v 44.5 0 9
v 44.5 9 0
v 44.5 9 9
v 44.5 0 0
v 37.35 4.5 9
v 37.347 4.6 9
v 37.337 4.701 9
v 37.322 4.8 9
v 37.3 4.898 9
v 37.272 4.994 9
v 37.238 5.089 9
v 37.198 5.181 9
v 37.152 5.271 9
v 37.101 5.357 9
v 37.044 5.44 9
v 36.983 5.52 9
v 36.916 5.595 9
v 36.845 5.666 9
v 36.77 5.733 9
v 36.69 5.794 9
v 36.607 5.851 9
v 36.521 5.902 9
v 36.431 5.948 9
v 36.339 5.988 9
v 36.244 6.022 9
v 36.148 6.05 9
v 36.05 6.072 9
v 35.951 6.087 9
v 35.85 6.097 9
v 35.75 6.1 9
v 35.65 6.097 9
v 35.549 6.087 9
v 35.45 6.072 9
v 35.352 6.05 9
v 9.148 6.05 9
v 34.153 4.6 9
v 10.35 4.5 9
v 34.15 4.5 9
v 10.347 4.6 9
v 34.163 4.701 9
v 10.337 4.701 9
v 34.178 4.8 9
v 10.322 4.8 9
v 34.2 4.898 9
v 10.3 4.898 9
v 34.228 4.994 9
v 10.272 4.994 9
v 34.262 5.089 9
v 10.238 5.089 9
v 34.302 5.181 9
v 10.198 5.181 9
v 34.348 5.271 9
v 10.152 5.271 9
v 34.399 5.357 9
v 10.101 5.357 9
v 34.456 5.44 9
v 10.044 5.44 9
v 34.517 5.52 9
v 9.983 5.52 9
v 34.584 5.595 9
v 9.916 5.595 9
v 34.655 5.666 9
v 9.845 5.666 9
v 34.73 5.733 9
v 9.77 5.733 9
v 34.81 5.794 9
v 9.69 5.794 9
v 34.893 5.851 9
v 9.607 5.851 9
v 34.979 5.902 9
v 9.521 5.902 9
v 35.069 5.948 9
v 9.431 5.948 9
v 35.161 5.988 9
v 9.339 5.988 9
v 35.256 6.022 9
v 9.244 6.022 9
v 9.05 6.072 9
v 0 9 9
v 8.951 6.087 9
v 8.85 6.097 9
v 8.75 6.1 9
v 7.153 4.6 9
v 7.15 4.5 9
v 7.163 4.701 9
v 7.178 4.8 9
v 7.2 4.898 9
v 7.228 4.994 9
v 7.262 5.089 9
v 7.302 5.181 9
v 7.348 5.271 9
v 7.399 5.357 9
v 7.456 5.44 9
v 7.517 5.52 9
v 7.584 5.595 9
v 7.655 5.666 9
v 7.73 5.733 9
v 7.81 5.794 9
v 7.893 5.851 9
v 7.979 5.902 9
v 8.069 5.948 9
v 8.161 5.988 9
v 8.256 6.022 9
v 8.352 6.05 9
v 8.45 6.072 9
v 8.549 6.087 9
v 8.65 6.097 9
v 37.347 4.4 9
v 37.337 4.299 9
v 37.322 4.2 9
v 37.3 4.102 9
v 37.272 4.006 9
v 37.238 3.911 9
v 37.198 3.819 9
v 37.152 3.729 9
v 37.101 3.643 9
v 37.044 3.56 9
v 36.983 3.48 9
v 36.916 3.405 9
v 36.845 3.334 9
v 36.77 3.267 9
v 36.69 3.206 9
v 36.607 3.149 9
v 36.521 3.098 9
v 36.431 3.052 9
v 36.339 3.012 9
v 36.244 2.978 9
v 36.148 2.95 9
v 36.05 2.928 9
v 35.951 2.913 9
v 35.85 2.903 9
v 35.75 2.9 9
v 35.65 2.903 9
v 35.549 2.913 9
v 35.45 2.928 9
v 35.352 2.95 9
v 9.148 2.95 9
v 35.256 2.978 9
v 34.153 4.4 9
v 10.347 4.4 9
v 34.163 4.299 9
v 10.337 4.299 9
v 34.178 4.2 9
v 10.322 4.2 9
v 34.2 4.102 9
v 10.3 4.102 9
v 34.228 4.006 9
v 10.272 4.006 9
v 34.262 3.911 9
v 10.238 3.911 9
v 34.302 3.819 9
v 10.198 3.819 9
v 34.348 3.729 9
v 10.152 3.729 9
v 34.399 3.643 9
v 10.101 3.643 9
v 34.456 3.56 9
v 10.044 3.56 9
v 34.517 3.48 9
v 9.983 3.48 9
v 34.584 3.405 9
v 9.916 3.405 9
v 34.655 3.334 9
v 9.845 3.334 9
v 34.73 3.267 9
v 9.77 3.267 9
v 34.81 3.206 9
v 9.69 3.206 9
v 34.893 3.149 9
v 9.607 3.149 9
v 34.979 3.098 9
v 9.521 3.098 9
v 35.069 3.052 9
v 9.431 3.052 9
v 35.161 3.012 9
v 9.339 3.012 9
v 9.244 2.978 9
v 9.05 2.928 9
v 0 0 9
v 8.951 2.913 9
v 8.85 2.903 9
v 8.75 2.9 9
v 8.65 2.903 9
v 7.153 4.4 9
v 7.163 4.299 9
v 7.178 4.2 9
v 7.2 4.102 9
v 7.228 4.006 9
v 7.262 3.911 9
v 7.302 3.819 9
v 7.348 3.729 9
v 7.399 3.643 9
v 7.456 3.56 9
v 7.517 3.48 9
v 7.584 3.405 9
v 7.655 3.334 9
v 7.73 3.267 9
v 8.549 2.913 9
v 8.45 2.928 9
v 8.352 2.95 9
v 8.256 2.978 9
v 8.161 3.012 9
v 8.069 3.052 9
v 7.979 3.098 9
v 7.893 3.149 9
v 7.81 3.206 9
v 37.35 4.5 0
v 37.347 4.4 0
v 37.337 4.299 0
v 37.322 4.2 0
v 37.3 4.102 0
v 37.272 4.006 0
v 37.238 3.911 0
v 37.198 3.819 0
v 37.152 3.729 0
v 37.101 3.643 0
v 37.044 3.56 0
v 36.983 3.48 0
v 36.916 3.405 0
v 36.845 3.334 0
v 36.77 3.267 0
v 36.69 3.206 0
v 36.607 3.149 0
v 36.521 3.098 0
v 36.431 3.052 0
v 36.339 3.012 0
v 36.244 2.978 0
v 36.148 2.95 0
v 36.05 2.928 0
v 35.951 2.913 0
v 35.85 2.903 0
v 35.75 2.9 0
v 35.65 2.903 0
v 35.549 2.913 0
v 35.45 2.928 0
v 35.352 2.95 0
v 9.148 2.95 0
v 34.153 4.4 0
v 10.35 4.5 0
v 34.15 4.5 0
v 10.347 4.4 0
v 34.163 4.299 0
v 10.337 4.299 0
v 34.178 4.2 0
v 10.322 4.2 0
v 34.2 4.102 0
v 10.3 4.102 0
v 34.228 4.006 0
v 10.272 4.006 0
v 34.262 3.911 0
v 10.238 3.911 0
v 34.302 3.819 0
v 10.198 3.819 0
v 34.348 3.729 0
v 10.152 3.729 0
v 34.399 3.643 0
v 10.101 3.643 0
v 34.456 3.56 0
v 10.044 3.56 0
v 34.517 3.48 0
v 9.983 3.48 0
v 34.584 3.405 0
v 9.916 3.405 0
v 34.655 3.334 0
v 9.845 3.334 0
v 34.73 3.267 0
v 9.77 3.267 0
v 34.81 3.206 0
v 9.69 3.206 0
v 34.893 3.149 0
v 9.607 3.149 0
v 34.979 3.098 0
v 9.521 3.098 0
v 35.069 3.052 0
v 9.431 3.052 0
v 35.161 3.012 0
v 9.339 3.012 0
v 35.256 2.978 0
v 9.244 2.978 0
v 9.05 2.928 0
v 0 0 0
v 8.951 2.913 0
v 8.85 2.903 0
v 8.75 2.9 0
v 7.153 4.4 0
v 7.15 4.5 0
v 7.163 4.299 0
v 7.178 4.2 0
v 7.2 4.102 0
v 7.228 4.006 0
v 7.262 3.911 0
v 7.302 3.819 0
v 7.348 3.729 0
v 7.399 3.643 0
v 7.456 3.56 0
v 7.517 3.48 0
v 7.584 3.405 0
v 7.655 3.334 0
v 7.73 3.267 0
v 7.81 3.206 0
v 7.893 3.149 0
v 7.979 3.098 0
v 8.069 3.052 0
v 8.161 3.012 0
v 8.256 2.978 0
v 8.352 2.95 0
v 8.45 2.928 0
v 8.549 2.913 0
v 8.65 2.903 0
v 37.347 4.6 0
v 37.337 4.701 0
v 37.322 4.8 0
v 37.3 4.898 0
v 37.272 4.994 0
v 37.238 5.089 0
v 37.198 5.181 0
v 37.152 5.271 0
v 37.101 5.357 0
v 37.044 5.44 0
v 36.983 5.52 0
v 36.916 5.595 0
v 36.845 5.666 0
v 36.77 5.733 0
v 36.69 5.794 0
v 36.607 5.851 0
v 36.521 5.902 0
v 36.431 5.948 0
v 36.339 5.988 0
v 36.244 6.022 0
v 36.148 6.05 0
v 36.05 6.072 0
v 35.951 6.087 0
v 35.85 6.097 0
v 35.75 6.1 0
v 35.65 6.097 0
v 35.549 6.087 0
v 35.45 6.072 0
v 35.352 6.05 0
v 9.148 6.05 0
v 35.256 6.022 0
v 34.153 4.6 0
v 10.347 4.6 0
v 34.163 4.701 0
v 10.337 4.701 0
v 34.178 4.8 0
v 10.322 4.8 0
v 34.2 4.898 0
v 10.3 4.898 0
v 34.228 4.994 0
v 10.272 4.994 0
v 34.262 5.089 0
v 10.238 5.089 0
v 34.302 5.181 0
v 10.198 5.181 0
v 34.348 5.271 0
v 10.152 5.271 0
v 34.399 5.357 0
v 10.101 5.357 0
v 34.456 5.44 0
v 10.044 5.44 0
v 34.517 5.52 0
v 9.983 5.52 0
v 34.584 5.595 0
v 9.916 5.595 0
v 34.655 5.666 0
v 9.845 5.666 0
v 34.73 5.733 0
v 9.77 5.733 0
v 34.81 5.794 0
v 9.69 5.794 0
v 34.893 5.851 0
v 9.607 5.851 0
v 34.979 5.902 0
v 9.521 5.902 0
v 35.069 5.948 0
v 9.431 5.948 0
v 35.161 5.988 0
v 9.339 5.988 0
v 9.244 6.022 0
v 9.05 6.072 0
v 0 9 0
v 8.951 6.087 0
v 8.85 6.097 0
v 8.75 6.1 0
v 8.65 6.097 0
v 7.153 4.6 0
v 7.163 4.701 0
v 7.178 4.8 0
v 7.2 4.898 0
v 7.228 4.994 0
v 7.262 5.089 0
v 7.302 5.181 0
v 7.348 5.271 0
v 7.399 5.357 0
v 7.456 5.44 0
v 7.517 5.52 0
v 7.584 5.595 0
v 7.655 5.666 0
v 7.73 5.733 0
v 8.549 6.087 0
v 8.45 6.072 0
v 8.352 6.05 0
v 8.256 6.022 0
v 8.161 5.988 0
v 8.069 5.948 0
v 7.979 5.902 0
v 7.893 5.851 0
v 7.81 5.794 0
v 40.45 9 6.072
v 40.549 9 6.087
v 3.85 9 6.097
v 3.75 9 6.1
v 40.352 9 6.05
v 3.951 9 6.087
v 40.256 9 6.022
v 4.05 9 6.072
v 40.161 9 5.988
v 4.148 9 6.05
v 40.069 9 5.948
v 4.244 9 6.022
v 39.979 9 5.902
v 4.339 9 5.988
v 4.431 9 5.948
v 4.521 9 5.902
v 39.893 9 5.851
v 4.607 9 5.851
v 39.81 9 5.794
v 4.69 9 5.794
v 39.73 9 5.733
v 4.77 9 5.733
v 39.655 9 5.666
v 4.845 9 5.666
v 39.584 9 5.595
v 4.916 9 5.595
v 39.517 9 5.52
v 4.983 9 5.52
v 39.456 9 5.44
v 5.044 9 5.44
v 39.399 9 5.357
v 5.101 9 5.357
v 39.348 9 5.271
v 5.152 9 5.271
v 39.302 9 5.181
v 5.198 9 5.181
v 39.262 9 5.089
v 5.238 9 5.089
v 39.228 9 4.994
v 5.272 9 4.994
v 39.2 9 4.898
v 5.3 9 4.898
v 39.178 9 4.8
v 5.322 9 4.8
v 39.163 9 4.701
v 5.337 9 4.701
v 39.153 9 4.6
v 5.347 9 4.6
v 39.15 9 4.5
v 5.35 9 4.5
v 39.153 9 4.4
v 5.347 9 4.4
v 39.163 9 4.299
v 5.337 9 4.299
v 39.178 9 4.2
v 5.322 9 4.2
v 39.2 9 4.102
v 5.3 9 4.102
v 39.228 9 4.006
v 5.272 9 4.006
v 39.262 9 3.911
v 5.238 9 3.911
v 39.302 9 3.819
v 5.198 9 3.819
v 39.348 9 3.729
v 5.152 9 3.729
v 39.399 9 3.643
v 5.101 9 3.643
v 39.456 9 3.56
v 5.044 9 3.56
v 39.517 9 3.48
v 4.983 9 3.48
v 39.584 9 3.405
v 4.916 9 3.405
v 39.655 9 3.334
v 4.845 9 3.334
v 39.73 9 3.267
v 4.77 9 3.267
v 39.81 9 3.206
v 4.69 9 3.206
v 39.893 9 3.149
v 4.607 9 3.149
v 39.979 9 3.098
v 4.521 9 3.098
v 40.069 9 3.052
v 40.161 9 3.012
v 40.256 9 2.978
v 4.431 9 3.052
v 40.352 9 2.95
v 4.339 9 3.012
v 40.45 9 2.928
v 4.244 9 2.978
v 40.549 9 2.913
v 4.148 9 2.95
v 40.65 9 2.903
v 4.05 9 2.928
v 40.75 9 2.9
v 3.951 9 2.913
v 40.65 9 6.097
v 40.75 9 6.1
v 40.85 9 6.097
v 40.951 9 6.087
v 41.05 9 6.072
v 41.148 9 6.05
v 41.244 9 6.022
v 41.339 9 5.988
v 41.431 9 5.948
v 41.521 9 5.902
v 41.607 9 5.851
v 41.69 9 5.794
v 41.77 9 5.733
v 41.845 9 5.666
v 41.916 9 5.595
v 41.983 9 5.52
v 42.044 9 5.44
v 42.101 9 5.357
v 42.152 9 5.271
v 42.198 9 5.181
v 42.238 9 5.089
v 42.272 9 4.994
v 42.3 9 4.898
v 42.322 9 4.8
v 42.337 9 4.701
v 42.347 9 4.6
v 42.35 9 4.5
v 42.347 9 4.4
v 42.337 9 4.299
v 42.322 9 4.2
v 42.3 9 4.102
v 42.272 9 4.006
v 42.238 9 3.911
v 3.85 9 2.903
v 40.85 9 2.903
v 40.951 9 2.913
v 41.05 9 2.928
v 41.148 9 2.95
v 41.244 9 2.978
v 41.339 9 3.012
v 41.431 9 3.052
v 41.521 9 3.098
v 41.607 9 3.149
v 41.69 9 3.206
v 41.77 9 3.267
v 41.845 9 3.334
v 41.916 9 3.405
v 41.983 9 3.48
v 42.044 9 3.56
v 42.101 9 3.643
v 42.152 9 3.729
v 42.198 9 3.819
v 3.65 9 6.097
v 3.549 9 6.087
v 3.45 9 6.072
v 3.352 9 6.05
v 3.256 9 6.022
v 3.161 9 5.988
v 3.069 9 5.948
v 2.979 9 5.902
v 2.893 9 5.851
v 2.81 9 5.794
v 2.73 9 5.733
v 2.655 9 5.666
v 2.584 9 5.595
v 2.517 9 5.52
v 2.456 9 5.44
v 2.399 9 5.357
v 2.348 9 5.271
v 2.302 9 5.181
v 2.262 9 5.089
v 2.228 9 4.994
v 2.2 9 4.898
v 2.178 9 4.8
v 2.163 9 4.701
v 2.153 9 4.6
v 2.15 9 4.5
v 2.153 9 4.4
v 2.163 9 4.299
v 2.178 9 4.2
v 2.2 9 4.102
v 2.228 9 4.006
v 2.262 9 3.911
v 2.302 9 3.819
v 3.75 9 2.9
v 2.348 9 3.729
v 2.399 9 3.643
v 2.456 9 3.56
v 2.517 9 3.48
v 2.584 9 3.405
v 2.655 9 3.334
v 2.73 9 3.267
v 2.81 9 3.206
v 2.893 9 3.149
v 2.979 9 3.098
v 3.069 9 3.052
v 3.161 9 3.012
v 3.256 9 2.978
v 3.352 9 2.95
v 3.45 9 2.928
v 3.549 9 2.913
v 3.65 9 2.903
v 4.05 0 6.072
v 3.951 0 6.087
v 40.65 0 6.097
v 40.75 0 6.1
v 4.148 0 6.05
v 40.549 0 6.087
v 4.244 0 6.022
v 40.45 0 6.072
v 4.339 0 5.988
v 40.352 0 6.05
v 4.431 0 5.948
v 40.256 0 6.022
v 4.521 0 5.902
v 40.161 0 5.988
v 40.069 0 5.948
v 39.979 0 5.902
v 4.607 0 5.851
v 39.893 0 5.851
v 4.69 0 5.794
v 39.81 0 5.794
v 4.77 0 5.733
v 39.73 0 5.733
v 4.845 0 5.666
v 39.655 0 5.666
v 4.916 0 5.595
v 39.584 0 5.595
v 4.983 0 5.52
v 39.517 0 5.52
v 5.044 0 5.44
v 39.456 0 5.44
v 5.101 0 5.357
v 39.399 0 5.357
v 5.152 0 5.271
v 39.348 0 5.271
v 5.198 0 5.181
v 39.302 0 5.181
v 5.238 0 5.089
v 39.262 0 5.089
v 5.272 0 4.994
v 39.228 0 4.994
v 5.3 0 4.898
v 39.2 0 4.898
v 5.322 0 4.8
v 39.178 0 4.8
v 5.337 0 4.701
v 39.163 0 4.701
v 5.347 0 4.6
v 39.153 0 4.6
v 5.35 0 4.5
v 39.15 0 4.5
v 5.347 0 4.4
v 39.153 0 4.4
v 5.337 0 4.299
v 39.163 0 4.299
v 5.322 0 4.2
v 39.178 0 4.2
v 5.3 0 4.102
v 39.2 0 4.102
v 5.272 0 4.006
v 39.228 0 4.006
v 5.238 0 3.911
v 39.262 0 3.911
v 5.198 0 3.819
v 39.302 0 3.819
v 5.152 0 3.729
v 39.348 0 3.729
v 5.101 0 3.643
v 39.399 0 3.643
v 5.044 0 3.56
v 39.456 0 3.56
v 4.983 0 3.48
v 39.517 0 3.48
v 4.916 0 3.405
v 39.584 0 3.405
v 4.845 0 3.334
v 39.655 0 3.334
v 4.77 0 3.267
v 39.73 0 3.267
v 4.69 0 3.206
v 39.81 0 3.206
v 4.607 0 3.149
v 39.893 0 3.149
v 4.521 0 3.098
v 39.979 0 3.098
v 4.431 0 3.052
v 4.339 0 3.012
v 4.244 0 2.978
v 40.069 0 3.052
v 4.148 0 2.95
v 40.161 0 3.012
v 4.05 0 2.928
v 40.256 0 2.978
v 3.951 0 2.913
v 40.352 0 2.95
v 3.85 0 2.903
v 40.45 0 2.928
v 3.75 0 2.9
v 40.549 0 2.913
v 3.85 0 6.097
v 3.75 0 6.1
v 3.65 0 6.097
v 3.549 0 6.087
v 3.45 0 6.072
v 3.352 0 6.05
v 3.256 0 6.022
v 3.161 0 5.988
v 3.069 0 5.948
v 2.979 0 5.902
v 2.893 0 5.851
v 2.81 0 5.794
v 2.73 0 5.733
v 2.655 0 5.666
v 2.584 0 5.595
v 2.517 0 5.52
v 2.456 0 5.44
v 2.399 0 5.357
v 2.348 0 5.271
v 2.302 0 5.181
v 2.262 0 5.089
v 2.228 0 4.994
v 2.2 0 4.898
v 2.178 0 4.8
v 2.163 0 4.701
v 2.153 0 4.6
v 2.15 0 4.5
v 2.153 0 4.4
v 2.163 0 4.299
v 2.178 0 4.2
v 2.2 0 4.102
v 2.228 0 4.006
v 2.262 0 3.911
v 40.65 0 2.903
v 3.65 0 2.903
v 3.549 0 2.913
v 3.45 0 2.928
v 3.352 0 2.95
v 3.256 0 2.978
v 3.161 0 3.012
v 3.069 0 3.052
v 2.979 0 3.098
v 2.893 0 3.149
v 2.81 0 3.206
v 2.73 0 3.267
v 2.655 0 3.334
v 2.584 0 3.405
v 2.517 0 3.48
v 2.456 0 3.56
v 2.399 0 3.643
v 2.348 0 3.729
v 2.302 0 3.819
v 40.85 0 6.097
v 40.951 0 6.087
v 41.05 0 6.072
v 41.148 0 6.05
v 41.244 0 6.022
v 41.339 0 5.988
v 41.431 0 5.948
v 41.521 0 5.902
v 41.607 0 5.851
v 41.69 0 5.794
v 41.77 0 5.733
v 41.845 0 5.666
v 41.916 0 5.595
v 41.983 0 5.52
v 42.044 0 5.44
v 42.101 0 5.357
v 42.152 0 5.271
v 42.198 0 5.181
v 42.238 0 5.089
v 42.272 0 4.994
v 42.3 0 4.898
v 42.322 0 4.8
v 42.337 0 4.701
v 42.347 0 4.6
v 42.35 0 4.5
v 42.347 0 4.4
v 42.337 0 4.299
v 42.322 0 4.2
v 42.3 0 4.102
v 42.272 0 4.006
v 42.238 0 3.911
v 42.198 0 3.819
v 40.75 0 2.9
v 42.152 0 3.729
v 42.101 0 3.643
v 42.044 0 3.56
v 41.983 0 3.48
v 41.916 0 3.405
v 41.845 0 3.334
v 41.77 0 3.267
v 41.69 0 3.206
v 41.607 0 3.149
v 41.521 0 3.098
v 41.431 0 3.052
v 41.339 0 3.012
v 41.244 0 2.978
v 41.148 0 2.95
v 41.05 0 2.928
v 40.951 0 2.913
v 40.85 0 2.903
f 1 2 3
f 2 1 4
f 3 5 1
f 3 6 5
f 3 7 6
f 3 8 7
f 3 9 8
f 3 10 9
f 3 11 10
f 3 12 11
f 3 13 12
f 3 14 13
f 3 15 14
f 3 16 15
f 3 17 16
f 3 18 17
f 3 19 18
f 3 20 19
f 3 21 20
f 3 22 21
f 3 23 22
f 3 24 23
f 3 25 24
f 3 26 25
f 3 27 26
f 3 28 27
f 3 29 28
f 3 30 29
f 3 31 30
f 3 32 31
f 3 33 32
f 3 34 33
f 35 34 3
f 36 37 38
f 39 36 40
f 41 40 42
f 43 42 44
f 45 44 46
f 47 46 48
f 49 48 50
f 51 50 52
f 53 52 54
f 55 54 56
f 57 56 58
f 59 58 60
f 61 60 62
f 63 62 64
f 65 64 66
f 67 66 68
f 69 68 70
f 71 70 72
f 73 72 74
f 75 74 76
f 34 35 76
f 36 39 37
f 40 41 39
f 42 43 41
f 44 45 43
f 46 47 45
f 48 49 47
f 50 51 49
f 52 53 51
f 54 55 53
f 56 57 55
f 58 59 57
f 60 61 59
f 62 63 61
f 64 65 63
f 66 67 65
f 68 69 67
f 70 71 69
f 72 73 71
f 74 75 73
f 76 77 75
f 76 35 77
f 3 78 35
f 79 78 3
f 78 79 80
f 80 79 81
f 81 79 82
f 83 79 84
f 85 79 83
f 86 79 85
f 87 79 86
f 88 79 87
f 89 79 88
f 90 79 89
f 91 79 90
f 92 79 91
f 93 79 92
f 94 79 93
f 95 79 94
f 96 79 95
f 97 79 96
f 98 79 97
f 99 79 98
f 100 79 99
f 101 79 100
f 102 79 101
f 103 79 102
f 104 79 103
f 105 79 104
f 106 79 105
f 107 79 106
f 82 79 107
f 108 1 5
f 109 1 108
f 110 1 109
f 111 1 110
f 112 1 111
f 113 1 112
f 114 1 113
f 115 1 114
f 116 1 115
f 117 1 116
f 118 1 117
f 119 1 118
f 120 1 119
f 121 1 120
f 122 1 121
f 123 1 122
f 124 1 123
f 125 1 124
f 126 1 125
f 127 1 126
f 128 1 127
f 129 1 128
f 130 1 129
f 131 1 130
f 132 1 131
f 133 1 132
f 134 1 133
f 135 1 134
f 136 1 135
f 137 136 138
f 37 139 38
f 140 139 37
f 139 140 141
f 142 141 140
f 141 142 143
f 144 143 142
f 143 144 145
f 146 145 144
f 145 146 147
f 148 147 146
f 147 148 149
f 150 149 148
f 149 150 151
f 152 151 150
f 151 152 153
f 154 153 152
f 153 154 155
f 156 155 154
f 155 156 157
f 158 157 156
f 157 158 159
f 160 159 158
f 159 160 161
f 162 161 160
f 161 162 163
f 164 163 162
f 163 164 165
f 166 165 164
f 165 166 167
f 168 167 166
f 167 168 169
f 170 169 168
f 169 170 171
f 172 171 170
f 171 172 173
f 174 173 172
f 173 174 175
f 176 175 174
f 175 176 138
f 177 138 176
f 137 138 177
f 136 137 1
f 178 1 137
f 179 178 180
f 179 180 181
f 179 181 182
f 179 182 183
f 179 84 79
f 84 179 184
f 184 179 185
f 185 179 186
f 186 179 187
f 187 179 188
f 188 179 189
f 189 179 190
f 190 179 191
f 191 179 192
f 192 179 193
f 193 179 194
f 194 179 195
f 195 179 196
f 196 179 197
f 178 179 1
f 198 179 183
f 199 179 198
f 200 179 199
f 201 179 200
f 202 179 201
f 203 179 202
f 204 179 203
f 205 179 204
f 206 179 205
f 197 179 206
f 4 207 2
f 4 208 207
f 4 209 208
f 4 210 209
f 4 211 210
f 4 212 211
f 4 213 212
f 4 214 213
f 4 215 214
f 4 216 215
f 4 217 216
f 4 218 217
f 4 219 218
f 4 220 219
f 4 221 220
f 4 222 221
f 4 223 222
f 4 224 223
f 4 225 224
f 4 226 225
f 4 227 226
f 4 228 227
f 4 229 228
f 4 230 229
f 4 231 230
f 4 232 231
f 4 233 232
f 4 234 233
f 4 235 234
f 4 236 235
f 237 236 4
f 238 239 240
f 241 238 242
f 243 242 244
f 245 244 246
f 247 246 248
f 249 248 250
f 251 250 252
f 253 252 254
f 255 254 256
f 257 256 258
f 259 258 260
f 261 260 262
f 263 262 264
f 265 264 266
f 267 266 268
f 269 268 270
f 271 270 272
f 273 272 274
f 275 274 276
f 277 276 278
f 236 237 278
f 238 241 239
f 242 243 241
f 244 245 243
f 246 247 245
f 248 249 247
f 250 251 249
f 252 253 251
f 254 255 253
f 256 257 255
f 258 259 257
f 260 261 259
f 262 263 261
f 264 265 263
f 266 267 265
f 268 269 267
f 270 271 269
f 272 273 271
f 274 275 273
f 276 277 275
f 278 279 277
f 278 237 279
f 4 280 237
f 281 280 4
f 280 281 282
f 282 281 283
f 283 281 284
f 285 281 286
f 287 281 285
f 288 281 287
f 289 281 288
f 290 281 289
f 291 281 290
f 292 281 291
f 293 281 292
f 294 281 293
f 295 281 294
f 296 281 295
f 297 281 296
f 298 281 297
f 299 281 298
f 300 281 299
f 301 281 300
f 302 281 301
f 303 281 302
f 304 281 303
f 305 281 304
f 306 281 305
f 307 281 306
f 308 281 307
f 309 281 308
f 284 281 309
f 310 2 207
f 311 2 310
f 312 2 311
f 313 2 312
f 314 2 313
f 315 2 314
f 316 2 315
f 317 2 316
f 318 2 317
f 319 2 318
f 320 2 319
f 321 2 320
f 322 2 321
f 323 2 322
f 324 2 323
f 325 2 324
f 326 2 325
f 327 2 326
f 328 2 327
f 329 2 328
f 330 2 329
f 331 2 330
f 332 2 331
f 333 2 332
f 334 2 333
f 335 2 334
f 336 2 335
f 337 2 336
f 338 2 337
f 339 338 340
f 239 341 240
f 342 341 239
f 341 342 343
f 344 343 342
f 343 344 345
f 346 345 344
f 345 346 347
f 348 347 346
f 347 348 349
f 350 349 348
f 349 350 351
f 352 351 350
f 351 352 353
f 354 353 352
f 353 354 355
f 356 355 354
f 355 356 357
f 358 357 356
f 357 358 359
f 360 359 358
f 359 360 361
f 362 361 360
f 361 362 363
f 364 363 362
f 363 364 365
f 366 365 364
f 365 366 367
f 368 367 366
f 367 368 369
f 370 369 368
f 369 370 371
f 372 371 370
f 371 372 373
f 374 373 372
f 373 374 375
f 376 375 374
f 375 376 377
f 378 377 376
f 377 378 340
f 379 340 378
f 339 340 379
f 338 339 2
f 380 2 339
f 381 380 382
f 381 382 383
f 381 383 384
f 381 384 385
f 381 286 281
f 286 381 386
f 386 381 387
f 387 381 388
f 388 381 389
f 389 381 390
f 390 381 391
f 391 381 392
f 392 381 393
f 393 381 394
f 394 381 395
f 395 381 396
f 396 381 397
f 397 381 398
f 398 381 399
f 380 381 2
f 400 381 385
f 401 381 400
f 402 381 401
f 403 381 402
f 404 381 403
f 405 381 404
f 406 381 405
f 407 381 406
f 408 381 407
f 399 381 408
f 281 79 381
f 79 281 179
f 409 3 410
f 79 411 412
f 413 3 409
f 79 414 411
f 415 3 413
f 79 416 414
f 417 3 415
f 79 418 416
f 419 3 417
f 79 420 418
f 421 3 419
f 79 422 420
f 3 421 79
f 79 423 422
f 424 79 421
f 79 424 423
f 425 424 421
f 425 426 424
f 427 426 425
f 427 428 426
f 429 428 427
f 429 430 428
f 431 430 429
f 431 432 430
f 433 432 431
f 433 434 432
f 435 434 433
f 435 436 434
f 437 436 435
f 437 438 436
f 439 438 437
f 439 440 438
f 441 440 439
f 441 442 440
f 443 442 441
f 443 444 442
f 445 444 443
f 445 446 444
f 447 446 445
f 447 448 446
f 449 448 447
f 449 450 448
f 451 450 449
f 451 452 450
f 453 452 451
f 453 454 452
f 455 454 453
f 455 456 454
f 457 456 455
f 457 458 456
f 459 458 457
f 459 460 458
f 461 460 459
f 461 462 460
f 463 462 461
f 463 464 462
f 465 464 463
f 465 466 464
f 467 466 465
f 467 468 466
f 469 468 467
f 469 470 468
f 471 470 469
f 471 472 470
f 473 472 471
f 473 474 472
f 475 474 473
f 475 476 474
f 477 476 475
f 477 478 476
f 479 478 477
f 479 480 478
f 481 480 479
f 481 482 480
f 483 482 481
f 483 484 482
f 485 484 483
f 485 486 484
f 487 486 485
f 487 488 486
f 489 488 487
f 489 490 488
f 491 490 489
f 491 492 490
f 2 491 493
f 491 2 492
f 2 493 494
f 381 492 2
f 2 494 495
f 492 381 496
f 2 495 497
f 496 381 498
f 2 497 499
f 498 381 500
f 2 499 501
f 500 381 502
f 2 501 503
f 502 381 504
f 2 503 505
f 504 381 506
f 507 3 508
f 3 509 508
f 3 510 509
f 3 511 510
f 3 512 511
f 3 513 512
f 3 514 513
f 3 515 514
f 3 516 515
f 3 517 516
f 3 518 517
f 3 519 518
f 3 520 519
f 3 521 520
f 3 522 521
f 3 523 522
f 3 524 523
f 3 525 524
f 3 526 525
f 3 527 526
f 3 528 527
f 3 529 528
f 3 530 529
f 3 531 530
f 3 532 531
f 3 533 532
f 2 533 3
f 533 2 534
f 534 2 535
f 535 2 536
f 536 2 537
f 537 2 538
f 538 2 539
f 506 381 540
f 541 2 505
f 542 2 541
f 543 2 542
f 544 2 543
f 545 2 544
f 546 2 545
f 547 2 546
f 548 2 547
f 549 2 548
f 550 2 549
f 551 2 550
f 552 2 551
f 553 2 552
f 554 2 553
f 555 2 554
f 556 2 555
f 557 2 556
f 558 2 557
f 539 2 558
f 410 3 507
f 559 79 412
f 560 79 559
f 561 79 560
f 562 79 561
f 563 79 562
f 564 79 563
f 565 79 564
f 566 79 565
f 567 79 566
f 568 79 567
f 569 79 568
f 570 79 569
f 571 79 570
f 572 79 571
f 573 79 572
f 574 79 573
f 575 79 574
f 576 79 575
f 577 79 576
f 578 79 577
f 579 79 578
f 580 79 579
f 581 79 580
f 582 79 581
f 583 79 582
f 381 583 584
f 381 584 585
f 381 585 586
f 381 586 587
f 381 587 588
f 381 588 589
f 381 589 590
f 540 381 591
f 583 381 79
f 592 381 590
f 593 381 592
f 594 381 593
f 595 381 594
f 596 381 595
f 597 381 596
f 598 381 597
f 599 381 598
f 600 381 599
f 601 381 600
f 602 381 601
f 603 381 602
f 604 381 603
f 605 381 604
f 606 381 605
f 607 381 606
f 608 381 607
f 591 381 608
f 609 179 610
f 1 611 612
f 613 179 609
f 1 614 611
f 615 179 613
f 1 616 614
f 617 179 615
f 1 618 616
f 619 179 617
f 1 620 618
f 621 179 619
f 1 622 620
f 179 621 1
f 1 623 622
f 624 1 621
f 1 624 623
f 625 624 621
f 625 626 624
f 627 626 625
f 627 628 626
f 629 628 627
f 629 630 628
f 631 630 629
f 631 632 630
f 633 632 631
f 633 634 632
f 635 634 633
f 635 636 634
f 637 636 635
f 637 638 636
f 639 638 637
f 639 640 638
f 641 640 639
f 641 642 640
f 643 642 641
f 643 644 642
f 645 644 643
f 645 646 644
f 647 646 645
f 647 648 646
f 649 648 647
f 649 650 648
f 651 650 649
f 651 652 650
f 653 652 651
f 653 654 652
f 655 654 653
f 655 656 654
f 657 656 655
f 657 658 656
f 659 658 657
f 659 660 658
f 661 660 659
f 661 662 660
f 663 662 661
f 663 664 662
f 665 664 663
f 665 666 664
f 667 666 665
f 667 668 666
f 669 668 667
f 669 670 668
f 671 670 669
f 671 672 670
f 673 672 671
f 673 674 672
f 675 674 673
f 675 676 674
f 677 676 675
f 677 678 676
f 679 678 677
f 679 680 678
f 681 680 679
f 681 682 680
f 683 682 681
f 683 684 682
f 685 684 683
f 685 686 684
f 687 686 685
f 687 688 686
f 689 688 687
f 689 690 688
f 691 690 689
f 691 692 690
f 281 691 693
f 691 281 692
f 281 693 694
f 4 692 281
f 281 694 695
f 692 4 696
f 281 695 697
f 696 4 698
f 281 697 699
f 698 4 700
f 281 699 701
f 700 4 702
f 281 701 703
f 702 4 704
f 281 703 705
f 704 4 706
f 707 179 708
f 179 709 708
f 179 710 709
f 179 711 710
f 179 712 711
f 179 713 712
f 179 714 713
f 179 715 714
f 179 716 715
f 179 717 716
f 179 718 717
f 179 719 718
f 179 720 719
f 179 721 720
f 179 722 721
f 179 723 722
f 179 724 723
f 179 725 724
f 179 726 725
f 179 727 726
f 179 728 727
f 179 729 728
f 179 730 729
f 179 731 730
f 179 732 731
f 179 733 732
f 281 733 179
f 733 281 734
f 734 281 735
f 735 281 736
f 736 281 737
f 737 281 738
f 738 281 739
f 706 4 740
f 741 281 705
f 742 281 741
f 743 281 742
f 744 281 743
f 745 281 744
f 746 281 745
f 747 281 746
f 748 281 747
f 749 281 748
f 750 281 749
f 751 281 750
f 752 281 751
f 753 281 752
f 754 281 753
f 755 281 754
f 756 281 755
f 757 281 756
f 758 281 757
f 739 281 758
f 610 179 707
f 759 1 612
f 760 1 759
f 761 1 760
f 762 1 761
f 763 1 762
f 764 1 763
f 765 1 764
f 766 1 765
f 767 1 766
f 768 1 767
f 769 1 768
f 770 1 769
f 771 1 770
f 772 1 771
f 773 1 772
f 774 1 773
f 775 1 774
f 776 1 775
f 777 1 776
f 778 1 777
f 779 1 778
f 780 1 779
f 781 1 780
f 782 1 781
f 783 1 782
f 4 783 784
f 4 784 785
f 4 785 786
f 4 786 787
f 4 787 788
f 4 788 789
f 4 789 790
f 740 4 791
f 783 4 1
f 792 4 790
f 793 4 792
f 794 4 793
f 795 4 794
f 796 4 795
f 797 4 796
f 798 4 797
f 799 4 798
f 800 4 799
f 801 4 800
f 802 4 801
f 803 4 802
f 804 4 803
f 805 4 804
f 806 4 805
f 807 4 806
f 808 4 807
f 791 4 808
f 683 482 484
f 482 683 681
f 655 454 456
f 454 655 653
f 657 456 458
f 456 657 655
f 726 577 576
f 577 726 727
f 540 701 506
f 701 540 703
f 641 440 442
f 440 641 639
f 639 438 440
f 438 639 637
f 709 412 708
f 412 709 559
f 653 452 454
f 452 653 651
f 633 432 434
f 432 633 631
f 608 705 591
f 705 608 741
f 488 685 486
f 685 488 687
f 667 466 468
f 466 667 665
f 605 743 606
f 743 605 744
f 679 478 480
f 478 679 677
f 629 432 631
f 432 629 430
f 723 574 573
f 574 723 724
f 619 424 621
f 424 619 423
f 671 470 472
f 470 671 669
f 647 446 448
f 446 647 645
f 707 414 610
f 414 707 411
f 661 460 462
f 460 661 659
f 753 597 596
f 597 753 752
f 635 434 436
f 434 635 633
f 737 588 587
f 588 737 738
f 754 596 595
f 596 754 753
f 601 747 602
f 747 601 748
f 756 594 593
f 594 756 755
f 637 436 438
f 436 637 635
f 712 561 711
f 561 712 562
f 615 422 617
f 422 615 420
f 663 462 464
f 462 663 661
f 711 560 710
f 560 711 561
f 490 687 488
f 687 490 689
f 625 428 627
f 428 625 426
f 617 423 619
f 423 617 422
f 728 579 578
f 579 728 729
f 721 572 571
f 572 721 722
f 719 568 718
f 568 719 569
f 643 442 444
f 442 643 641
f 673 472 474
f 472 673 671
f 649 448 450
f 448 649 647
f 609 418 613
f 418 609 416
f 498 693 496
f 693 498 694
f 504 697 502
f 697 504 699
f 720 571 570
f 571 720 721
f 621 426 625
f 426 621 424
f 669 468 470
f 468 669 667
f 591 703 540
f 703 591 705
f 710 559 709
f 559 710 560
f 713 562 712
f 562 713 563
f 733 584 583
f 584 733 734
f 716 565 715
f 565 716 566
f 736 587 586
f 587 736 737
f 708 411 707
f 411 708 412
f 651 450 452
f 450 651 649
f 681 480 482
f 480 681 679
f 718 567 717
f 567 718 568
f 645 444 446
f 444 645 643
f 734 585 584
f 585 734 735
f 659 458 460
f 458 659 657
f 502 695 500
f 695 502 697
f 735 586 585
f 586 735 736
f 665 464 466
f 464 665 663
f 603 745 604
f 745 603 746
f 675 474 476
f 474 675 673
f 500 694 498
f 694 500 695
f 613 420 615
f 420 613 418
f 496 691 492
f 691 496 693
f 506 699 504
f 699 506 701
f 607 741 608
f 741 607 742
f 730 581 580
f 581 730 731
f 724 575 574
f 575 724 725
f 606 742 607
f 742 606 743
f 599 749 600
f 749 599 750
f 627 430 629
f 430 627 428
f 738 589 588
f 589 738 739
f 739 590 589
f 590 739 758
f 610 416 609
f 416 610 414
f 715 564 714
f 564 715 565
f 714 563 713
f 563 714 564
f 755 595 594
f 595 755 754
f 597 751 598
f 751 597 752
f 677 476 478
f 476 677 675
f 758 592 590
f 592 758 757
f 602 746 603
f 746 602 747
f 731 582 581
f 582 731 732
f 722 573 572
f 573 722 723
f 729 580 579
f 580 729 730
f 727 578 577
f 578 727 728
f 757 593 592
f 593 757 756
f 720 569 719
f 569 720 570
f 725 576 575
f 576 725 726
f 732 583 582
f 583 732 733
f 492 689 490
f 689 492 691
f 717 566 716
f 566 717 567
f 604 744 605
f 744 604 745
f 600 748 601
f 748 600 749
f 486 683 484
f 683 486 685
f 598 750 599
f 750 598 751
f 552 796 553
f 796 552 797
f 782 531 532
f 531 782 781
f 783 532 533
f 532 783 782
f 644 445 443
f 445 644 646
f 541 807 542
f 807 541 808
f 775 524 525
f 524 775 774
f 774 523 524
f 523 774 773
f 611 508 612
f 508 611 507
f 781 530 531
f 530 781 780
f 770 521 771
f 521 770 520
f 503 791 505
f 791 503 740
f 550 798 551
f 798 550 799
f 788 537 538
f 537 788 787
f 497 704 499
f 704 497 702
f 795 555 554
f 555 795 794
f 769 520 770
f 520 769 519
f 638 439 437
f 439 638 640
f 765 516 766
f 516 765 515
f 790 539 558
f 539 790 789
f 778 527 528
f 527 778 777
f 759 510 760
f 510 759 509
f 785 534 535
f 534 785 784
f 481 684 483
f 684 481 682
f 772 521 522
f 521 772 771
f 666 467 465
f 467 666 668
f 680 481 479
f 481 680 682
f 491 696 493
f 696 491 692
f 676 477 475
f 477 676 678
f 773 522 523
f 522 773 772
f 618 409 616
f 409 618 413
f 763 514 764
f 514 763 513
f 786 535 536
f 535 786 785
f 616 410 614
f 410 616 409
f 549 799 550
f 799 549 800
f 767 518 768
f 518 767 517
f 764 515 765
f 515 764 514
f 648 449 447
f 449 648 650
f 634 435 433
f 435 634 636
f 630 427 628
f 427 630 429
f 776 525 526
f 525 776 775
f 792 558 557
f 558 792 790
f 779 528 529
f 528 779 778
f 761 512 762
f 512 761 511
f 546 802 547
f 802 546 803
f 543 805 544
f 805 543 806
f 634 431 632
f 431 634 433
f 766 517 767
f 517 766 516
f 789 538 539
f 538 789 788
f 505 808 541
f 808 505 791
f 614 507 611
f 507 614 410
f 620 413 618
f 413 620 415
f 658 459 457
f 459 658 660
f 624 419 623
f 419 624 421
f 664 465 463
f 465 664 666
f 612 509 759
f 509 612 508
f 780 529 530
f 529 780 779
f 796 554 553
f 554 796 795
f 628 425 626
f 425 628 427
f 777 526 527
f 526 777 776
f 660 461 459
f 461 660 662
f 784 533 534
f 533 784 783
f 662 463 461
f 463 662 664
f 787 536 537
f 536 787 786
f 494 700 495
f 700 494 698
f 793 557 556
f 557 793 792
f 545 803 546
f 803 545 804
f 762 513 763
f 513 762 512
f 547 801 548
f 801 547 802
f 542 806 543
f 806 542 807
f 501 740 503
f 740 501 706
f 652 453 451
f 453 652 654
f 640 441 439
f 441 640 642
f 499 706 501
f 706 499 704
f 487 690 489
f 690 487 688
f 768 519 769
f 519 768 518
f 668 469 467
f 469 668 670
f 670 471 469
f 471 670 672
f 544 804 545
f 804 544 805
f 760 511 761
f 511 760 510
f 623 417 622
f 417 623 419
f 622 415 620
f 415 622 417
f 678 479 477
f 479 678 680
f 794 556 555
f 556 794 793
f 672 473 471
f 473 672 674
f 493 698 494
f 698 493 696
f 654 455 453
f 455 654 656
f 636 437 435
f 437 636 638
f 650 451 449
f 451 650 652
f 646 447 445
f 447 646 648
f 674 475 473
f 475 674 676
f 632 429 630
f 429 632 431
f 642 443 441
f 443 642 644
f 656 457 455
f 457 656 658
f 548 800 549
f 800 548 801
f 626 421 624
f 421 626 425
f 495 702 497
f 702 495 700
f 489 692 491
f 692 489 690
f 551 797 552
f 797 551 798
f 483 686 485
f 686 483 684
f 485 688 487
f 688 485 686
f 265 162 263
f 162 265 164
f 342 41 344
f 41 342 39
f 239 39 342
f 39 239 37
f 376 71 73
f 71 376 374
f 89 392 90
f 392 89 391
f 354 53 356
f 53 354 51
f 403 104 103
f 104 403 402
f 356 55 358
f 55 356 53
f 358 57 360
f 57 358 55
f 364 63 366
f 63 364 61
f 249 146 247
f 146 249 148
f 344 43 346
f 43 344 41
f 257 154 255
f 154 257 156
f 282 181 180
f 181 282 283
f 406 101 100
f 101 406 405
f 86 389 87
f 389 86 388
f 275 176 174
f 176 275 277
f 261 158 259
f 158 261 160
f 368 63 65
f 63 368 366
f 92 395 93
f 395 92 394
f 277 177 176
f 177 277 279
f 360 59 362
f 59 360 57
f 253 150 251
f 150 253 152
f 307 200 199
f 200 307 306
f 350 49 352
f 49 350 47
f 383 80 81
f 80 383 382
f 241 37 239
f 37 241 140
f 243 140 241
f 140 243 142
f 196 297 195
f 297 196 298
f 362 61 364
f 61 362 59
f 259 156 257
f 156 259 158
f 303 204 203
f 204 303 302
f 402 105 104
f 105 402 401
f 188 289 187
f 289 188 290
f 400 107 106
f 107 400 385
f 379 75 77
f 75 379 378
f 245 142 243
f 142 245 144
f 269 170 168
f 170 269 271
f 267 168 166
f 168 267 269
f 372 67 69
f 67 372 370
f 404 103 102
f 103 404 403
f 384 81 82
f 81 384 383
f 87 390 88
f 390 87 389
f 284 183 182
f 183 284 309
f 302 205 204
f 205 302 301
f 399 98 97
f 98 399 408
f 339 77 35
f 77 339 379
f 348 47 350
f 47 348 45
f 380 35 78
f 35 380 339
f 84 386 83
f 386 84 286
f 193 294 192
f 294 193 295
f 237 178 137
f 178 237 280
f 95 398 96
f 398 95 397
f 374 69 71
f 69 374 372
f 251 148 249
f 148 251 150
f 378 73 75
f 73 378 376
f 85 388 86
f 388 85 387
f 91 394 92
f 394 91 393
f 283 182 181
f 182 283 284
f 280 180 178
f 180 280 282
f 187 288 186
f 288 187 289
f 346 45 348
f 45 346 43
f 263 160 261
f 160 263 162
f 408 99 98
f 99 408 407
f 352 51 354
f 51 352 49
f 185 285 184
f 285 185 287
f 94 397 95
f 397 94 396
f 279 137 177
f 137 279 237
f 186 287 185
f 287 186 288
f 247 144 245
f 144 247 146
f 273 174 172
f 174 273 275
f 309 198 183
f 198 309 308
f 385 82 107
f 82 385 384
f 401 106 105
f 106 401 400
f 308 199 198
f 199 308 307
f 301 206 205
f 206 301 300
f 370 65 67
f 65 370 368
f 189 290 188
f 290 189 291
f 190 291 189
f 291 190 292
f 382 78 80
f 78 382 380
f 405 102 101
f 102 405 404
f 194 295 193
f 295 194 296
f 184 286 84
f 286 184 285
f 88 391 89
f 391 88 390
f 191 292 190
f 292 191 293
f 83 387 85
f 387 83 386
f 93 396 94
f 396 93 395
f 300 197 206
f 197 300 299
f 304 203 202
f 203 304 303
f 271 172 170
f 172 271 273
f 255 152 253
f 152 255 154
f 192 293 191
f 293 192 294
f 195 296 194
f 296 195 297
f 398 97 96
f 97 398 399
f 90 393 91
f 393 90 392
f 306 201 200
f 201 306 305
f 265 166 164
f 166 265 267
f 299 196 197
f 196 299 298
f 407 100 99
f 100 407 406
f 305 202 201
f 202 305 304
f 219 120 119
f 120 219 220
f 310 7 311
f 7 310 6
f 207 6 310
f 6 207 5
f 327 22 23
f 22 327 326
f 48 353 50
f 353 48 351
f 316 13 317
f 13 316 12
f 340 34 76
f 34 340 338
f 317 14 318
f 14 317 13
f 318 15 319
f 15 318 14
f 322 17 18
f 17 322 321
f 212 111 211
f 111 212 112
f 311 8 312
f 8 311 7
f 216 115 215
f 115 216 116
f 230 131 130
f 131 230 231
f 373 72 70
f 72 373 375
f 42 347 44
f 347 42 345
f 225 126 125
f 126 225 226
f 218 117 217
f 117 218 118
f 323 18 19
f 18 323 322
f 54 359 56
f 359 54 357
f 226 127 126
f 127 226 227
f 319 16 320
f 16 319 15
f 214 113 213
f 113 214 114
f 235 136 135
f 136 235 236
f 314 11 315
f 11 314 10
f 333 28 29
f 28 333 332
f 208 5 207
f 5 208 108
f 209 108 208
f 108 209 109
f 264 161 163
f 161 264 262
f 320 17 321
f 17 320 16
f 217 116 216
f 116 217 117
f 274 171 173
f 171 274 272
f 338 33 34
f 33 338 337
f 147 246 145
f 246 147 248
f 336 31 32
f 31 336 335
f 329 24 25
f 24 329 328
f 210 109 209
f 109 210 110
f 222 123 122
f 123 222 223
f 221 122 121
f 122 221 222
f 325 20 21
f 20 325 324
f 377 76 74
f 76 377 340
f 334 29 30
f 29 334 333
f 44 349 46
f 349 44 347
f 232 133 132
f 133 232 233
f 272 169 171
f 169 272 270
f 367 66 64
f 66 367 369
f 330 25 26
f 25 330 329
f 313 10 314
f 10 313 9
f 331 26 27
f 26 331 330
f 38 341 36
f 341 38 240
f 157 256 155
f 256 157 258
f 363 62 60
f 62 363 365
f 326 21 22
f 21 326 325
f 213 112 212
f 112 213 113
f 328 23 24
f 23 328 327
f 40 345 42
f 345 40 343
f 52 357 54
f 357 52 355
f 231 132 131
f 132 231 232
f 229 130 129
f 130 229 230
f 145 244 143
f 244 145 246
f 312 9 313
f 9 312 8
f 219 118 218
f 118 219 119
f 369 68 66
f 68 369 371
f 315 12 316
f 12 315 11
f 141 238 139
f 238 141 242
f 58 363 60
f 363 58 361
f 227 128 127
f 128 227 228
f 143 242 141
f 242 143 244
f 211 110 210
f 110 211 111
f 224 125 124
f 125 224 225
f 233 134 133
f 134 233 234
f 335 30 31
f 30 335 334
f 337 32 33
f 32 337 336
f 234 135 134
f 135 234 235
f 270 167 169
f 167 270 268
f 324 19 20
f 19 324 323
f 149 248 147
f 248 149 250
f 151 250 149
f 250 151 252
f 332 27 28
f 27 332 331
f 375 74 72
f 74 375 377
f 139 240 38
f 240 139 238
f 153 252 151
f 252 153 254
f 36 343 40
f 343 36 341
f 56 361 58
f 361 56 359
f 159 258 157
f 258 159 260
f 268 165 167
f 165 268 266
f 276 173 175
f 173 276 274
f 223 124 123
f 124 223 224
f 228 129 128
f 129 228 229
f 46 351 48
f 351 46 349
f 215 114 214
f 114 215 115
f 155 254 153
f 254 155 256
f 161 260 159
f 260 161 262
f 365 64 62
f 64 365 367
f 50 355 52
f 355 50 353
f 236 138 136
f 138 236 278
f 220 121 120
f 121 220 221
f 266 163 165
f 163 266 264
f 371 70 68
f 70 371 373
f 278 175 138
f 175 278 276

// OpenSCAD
/*
This is a mounting adaptor for the Sharp IR Sensor and the Servo Arm
*/

adaptor();

module adaptor($fn=100)
{
    difference()
    {
        cube([44.5, 9.0, 9.0], center = false);
        translate([(44.5-37.0)/2, 4.5, 4.5]) rotate([90, 0, 0])#cylinder(h = 15, d = 3.2, center = true);   // left sensor
        translate([(44.5-37.0)/2+37.0, 4.5, 4.5]) rotate([90, 0, 0])#cylinder(h = 15, d = 3.2, center = true);  // right sensor
        
        translate([(44.5-27.0)/2, 4.5, 4.5]) rotate([0, 0, 0])#cylinder(h = 15, d = 3.2, center = true);  // left servo
        translate([(44.5-27.0)/2+27.0, 4.5, 4.5]) rotate([0, 0, 0])#cylinder(h = 15, d = 3.2, center = true);  // right servo
    }
}
